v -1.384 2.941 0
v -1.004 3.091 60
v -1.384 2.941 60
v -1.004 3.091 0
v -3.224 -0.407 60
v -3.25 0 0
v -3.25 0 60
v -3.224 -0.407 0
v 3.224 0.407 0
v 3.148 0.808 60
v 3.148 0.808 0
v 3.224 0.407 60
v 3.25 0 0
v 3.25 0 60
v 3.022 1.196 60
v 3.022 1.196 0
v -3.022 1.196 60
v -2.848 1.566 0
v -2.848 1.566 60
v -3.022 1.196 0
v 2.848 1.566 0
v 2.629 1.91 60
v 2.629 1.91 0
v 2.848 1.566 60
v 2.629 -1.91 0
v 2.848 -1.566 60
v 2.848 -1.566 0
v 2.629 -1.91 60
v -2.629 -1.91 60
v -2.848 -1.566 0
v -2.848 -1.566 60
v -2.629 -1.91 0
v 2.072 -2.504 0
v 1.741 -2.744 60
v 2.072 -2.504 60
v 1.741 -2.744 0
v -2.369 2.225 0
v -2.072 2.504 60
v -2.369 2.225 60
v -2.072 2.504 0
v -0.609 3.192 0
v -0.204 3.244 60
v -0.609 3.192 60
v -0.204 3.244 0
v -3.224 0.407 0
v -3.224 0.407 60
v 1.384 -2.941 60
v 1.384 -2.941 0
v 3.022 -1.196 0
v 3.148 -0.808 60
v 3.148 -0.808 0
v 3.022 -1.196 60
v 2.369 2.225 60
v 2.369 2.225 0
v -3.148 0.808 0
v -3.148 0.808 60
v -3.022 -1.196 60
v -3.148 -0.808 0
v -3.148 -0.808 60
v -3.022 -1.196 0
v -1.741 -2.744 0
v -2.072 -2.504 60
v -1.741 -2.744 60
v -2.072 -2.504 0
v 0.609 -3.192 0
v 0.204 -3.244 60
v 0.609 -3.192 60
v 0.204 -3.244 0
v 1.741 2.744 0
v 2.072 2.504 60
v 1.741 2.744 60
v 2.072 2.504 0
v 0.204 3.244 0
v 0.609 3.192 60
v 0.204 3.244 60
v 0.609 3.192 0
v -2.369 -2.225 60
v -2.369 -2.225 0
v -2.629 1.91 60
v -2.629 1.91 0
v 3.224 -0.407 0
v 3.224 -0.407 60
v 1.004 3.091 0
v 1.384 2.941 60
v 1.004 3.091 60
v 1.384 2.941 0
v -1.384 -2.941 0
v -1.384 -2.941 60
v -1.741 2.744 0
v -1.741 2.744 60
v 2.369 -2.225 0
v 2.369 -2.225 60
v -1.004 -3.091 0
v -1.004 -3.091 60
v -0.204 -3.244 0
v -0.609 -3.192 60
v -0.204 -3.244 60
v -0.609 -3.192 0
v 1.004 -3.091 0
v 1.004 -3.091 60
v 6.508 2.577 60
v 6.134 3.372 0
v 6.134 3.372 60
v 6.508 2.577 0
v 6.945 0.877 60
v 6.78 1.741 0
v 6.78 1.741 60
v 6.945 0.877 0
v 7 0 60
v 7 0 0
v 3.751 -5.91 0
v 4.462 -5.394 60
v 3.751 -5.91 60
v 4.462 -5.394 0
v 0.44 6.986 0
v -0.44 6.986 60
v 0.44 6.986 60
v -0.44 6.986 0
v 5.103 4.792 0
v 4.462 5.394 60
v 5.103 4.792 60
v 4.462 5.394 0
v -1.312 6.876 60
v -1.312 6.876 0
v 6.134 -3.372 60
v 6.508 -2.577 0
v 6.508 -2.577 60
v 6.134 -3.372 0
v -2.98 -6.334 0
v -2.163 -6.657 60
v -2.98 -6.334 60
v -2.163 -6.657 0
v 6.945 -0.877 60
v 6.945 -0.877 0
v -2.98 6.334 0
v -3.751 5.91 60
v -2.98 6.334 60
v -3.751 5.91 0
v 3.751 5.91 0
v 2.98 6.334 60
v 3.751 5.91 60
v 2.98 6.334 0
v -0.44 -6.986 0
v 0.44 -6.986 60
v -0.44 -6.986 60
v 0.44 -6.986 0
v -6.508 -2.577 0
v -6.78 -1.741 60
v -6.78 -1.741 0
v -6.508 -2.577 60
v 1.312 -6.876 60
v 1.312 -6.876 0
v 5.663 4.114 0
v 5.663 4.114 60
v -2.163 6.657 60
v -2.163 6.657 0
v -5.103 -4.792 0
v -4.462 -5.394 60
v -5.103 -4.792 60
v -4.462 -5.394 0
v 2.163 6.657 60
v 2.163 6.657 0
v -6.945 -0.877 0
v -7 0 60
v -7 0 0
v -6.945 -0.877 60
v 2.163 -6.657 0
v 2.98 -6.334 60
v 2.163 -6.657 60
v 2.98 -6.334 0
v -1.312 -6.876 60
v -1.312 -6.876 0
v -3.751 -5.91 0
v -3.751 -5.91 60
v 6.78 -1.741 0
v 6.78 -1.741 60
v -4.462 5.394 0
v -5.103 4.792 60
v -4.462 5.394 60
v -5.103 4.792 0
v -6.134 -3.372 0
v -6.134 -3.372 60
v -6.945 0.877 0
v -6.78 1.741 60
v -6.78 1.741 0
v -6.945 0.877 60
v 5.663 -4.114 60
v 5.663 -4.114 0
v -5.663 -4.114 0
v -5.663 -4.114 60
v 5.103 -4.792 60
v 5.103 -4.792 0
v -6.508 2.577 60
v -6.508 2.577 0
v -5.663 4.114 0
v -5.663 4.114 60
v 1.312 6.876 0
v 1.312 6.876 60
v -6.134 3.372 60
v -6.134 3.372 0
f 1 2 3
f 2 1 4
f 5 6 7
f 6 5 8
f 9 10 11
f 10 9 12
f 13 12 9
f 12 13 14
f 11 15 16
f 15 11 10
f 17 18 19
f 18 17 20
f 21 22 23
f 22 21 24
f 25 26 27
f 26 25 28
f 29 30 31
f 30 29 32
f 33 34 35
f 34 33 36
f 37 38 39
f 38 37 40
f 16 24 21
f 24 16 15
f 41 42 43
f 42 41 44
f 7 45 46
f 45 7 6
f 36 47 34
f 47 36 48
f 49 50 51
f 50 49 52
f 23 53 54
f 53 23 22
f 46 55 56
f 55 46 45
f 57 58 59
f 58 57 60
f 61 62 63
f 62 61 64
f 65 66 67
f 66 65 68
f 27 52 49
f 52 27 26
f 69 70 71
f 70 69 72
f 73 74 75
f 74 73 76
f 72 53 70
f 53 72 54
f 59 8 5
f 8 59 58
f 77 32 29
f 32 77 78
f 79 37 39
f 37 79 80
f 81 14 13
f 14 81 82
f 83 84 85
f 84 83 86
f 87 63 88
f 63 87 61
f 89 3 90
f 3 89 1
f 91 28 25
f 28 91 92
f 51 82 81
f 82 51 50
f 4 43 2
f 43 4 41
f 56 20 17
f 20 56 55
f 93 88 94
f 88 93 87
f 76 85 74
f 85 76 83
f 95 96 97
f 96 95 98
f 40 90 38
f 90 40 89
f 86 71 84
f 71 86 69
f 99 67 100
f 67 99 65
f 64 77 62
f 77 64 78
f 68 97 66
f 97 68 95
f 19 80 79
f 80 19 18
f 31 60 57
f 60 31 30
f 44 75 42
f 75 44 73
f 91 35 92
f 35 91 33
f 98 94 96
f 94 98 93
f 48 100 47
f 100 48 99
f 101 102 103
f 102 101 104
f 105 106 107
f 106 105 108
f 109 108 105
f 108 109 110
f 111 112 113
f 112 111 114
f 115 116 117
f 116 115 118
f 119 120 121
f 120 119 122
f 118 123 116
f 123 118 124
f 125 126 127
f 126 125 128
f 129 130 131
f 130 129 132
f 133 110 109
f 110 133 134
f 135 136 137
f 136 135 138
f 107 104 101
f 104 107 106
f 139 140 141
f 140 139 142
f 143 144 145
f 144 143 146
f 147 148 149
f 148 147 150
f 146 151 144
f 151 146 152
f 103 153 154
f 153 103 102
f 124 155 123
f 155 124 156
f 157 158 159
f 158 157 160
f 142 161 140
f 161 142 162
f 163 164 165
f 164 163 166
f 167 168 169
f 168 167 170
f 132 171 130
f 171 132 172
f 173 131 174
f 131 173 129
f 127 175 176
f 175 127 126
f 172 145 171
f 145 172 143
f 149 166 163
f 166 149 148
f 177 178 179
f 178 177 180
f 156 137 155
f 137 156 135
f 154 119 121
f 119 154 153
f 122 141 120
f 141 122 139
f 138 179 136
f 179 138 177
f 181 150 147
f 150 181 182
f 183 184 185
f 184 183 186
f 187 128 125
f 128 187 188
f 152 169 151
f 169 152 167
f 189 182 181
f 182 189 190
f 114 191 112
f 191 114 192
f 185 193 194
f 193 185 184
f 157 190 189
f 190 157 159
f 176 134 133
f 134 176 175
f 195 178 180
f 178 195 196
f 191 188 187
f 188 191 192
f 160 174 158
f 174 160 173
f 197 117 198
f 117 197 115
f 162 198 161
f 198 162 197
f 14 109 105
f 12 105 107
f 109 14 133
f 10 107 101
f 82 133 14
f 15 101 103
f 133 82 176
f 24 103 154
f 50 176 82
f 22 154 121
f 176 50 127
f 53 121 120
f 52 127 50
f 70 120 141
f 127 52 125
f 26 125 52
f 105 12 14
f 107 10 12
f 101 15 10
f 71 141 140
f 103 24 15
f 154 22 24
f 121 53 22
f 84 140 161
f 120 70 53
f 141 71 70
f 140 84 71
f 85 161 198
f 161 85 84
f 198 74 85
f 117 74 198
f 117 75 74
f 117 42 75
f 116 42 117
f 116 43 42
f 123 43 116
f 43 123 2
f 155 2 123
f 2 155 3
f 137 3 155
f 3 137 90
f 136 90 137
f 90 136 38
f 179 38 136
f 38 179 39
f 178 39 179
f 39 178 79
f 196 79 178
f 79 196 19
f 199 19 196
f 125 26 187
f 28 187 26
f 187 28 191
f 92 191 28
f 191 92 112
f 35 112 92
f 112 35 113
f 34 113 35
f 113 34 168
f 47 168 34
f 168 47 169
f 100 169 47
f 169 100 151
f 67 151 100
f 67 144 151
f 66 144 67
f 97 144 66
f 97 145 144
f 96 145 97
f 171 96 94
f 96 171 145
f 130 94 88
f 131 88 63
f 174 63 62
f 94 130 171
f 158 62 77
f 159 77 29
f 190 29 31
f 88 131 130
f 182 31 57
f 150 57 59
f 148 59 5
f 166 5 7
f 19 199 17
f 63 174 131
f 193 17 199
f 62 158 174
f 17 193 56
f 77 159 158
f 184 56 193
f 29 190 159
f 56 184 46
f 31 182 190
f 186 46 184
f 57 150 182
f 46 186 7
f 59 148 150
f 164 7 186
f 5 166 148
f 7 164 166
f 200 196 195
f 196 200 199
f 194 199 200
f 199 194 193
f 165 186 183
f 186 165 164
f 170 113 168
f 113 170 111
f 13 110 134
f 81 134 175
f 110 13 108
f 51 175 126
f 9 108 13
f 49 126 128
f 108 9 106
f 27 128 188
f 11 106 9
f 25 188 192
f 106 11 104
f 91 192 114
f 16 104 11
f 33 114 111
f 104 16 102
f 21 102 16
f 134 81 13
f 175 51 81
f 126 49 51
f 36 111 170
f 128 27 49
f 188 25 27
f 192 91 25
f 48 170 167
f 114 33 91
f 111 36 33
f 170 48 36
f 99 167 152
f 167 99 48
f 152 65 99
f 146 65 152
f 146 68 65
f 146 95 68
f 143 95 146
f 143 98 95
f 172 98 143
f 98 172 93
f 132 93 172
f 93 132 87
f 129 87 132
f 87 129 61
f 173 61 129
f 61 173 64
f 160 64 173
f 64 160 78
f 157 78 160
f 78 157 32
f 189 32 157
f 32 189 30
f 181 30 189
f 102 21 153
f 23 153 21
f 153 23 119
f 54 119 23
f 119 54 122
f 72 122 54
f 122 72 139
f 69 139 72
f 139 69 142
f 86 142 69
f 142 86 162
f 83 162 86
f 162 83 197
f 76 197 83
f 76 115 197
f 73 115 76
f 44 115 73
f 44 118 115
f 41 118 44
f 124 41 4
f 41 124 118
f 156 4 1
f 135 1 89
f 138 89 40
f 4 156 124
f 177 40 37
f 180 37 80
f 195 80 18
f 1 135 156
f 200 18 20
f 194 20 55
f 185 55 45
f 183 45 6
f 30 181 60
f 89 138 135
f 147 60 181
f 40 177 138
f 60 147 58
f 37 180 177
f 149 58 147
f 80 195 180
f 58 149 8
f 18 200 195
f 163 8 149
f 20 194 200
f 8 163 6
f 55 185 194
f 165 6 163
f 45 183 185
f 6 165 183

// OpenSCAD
$fn = 50;


difference() {
	union() {
		*color(alpha = 1.0000000000, c = "gray") {
			translate(v = [0, 7, 0]) {
				linear_extrude(height = 1) {
					text(font = "Arial:style=Bold", halign = "center", size = 4.5000000000, text = "COMMENT plate main", valign = "center");
				}
			}
		}
		cylinder(h = 60, r = 7.0000000000);
	}
	union() {
		*color(alpha = 1.0000000000, c = "gray") {
			translate(v = [0, 7, 0]) {
				linear_extrude(height = 1) {
					text(font = "Arial:style=Bold", halign = "center", size = 4.5000000000, text = "COMMENT holes main", valign = "center");
				}
			}
		}
		translate(v = [0, 0, -100]) {
			cylinder(h = 200, r = 3.2500000000);
		}
		translate(v = [0, 0, -100]) {
			cylinder(h = 200, r = 1.8000000000);
		}
	}
}
